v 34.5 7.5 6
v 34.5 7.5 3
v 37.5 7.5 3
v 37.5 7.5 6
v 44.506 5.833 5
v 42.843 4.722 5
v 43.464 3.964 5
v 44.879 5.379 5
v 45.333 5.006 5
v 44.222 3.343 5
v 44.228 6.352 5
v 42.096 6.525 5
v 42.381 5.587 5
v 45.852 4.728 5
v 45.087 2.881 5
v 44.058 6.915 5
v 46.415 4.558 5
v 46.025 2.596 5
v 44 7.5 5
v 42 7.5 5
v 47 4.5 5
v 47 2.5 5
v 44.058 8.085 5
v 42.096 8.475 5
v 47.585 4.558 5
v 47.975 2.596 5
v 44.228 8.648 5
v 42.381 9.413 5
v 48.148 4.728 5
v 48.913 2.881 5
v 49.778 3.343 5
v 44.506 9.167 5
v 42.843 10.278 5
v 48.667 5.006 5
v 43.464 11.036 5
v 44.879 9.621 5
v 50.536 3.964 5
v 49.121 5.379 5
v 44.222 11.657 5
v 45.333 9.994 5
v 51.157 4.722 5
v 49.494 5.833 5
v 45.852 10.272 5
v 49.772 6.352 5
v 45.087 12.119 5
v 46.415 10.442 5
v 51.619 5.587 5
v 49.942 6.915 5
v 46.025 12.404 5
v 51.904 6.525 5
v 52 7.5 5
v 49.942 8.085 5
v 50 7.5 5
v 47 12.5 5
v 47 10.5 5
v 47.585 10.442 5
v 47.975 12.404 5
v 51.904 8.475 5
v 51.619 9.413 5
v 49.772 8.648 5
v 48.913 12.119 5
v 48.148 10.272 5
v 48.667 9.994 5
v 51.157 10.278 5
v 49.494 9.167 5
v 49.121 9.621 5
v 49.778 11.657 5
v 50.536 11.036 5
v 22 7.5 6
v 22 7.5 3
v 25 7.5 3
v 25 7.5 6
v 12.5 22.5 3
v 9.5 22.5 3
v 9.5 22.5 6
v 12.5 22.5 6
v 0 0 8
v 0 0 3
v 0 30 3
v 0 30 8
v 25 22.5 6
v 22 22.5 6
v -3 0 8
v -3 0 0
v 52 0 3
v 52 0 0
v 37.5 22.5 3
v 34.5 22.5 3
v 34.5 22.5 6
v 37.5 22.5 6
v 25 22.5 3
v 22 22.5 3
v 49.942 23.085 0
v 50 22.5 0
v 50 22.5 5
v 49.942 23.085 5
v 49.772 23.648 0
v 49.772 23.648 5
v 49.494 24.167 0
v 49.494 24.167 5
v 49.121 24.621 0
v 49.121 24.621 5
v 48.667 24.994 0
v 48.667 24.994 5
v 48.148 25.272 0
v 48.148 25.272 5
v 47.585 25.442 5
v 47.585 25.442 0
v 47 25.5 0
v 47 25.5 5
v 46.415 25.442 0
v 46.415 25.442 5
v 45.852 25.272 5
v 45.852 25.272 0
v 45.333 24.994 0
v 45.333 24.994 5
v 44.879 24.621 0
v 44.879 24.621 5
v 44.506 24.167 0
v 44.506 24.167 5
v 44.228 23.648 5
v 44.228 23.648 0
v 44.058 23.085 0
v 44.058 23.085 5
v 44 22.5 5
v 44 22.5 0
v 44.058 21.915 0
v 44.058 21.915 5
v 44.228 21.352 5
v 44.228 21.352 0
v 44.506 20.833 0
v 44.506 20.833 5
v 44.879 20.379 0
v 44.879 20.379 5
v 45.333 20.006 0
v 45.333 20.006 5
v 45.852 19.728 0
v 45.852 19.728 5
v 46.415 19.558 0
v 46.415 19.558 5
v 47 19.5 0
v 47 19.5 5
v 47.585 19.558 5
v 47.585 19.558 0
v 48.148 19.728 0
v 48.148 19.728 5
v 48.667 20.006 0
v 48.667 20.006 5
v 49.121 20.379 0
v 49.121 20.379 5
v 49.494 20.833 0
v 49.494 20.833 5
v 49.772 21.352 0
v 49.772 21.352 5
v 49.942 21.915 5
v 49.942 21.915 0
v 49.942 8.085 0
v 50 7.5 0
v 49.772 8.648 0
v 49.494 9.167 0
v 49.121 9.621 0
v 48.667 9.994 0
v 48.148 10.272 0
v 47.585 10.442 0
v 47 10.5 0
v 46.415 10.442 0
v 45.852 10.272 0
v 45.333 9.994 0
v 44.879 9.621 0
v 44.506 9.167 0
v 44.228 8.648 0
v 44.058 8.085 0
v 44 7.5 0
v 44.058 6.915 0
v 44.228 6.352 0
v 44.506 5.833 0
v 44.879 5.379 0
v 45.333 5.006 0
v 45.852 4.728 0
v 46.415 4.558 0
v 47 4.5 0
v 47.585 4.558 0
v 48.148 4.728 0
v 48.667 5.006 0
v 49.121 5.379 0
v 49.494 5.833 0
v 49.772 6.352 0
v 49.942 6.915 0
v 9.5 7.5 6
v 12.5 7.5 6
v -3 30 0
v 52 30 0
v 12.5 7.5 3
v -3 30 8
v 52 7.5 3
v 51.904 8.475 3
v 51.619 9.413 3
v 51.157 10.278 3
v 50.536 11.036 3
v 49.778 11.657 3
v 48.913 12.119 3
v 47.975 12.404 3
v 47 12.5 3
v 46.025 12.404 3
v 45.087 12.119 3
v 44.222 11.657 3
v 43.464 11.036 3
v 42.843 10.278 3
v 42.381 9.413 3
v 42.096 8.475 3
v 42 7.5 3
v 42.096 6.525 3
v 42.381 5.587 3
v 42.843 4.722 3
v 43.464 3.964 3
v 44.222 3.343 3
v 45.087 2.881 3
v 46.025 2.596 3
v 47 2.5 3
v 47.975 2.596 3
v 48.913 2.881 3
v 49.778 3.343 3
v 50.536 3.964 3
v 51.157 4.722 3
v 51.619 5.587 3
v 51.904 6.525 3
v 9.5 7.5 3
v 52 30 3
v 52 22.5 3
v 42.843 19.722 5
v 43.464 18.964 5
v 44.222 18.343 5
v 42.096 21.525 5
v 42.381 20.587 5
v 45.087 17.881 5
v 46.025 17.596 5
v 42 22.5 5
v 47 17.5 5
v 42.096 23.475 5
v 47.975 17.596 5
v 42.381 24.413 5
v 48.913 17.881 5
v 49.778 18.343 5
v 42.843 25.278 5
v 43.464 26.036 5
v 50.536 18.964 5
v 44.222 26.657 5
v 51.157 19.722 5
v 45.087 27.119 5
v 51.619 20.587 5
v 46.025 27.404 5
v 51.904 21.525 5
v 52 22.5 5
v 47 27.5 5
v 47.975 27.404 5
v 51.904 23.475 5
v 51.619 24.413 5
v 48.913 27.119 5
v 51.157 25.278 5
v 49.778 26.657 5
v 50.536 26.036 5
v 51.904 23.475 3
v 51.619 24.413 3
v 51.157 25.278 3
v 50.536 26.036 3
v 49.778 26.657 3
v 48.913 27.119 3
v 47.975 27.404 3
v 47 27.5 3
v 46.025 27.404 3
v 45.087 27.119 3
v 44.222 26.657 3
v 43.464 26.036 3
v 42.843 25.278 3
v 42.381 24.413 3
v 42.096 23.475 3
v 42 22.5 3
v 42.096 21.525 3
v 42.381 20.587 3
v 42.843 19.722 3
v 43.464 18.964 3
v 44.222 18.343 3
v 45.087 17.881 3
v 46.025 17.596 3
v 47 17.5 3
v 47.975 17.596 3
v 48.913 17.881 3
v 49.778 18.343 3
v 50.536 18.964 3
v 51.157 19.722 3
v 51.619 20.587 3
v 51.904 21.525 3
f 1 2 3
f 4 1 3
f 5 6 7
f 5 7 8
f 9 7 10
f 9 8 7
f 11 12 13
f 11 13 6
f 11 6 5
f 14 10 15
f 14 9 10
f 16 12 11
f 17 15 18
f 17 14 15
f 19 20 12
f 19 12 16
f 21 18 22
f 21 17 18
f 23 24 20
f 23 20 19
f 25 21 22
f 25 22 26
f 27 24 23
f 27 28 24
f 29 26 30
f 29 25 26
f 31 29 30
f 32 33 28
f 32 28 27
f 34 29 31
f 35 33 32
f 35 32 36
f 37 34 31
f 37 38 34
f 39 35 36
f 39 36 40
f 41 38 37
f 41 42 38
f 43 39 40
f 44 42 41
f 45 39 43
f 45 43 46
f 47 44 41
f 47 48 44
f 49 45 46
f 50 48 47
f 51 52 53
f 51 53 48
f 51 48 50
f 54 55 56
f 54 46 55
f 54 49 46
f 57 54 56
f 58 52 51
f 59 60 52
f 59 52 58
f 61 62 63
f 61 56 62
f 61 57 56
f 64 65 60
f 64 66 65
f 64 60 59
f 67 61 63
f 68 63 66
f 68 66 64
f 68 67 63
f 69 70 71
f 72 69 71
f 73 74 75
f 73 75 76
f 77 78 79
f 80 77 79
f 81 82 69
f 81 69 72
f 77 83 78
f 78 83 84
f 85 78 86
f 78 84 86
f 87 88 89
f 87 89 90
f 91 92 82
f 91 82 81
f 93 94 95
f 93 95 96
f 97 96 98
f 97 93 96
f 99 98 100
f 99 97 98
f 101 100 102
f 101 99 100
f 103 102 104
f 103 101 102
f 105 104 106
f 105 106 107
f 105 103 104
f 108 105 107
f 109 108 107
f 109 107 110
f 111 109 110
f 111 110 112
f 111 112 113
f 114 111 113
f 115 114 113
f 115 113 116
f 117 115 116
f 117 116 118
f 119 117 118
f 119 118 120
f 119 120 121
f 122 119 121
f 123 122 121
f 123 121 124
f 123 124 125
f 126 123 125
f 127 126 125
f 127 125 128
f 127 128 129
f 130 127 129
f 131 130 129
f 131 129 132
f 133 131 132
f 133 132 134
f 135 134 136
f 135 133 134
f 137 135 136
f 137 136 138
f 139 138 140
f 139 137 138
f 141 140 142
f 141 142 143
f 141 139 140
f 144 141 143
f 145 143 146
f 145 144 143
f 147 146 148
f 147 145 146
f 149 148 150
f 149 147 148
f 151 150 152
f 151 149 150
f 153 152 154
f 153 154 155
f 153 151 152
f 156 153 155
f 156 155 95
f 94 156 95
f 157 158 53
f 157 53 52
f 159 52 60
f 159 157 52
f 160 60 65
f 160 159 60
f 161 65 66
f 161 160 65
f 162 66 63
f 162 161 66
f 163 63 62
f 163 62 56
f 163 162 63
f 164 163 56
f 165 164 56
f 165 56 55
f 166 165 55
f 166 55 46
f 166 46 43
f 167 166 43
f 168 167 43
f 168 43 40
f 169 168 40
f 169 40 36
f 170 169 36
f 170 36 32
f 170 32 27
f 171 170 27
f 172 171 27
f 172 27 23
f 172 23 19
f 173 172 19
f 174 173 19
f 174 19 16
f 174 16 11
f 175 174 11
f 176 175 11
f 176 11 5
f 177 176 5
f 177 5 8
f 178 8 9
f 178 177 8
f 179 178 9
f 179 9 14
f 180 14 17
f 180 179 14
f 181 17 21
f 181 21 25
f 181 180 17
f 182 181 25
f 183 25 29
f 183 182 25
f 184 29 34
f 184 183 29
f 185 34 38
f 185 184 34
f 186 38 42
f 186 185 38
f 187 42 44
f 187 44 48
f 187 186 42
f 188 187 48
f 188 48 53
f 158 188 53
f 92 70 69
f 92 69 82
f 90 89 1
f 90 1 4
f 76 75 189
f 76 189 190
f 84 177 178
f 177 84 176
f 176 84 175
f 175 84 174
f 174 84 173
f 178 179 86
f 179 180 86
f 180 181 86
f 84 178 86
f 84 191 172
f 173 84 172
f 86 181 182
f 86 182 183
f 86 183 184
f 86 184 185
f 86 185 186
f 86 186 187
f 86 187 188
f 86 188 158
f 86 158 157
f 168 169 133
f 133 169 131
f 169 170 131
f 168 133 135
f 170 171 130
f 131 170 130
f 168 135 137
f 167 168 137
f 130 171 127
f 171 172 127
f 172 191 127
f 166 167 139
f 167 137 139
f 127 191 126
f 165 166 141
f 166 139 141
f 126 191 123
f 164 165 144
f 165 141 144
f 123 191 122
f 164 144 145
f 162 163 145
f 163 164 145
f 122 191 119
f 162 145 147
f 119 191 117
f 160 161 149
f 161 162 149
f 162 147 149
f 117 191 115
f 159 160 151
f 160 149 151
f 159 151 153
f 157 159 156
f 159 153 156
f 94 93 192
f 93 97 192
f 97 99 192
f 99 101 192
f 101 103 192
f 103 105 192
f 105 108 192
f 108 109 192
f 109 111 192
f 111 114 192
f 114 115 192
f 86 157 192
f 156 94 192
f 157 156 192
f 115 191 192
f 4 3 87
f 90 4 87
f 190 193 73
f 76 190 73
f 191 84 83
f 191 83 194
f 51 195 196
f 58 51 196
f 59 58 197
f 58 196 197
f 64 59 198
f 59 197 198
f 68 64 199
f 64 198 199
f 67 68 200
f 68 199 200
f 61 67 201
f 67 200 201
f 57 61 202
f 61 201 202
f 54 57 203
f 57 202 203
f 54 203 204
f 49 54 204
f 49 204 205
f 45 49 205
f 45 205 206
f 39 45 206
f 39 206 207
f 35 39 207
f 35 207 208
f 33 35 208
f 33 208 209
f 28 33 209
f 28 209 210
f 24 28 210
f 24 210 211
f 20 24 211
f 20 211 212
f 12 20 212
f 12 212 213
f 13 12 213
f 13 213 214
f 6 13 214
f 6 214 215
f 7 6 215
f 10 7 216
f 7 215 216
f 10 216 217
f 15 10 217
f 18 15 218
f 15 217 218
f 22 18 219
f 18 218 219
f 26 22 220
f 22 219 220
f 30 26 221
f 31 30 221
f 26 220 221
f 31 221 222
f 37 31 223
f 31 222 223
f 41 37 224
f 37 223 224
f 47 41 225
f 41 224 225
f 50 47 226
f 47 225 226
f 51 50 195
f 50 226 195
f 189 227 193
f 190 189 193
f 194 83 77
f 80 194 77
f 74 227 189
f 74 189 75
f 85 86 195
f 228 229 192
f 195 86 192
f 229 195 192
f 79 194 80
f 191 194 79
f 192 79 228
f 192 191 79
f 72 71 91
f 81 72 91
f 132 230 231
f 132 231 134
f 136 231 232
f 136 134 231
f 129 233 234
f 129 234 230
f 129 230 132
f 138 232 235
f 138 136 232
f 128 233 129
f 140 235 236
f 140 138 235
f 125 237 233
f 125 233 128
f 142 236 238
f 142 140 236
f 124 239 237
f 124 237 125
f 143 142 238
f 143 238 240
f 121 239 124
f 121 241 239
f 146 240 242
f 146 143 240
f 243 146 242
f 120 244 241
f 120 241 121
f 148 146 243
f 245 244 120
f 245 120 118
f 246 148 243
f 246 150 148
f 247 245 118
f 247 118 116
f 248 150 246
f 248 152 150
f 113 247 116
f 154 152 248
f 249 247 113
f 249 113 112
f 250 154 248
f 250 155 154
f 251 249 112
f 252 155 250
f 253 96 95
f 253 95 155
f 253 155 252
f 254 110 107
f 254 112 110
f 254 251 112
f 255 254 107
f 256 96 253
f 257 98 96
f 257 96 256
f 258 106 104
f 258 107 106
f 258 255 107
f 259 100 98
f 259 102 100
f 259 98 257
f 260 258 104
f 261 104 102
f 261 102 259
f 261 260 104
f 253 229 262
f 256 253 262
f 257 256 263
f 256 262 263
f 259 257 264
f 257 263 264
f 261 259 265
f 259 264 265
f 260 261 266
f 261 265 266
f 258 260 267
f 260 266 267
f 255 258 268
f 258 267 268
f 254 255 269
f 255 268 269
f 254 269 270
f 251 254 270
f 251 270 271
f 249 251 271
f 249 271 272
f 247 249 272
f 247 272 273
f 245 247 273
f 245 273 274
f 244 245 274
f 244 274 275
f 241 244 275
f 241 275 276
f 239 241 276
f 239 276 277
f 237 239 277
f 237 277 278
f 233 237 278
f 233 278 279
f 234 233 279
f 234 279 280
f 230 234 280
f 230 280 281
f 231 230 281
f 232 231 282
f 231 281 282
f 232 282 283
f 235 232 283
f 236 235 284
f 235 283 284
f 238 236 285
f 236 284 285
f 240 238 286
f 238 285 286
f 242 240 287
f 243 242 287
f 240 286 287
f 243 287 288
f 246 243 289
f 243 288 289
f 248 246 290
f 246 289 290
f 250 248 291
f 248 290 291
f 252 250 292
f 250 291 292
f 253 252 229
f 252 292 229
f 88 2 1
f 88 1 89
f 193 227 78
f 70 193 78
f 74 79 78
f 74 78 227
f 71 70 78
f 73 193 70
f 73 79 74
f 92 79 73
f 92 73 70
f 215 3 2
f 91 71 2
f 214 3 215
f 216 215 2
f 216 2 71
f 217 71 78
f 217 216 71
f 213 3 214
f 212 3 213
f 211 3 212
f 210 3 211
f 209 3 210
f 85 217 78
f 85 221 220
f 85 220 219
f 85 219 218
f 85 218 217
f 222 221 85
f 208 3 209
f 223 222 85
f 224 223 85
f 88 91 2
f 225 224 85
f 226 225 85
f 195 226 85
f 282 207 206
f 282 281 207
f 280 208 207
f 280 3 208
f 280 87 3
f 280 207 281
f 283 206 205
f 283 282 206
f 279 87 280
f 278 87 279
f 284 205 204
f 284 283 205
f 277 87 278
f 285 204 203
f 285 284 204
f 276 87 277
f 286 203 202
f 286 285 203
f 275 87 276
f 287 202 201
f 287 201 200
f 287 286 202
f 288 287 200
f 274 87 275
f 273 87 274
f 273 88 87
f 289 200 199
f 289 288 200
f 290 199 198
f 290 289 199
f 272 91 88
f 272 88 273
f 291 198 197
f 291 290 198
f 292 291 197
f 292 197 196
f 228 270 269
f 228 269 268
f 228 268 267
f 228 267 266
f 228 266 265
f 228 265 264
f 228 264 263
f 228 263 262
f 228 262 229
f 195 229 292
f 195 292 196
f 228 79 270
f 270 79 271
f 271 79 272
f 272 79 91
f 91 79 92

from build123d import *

# Parameters (mm, degrees)
F0_R     = 5
F0_W     = 3
F0_H     = 15
F0_R_2   = 3
F1_DEPTH = 3
F0_H_2   = 30
F2_DEPTH = 8
F3_DEPTH = 6
F4_DEPTH = 5


with BuildPart() as f1:
    # F0 (on Top) → F1 (new body)
    with BuildSketch(Plane.XY):
        Polygon((52, 30), (0, 30), (0, 0), (52, 0), (52, 7.5), (52, 22.5), align=None)
        with Locations((47, 7.5)):
            Circle(F0_R, mode=Mode.SUBTRACT)
        with Locations((11, 15)):
            Rectangle(F0_W, F0_H, mode=Mode.SUBTRACT)
        with Locations((23.5, 15)):
            Rectangle(F0_W, F0_H, mode=Mode.SUBTRACT)
        with Locations((36, 15)):
            Rectangle(F0_W, F0_H, mode=Mode.SUBTRACT)
        with Locations((47, 22.5)):
            Circle(F0_R, mode=Mode.SUBTRACT)
        with Locations((47, 7.5)):
            Circle(F0_R)
        with Locations((47, 7.5)):
            Circle(F0_R_2, mode=Mode.SUBTRACT)
        with Locations((47, 22.5)):
            Circle(F0_R)
        with Locations((47, 22.5)):
            Circle(F0_R_2, mode=Mode.SUBTRACT)
    extrude(amount=F1_DEPTH)

    # F0 (on Top) → F2 (join, through all)
    with BuildSketch(Plane.XY):
        with Locations((-1.5, 15)):
            Rectangle(F0_W, F0_H_2)
    extrude(amount=F2_DEPTH)

    # F0 (on Top) → F3 (join, through all)
    with BuildSketch(Plane.XY):
        with Locations((11, 15)):
            Rectangle(F0_W, F0_H)
        with Locations((23.5, 15)):
            Rectangle(F0_W, F0_H)
        with Locations((36, 15)):
            Rectangle(F0_W, F0_H)
    extrude(amount=F3_DEPTH)

    # F0 (on Top) → F4 (join, through all)
    with BuildSketch(Plane.XY):
        with Locations((47, 22.5)):
            Circle(F0_R)
        with Locations((47, 22.5)):
            Circle(F0_R_2, mode=Mode.SUBTRACT)
        with Locations((47, 7.5)):
            Circle(F0_R)
        with Locations((47, 7.5)):
            Circle(F0_R_2, mode=Mode.SUBTRACT)
    extrude(amount=F4_DEPTH)


solid = f1.part
